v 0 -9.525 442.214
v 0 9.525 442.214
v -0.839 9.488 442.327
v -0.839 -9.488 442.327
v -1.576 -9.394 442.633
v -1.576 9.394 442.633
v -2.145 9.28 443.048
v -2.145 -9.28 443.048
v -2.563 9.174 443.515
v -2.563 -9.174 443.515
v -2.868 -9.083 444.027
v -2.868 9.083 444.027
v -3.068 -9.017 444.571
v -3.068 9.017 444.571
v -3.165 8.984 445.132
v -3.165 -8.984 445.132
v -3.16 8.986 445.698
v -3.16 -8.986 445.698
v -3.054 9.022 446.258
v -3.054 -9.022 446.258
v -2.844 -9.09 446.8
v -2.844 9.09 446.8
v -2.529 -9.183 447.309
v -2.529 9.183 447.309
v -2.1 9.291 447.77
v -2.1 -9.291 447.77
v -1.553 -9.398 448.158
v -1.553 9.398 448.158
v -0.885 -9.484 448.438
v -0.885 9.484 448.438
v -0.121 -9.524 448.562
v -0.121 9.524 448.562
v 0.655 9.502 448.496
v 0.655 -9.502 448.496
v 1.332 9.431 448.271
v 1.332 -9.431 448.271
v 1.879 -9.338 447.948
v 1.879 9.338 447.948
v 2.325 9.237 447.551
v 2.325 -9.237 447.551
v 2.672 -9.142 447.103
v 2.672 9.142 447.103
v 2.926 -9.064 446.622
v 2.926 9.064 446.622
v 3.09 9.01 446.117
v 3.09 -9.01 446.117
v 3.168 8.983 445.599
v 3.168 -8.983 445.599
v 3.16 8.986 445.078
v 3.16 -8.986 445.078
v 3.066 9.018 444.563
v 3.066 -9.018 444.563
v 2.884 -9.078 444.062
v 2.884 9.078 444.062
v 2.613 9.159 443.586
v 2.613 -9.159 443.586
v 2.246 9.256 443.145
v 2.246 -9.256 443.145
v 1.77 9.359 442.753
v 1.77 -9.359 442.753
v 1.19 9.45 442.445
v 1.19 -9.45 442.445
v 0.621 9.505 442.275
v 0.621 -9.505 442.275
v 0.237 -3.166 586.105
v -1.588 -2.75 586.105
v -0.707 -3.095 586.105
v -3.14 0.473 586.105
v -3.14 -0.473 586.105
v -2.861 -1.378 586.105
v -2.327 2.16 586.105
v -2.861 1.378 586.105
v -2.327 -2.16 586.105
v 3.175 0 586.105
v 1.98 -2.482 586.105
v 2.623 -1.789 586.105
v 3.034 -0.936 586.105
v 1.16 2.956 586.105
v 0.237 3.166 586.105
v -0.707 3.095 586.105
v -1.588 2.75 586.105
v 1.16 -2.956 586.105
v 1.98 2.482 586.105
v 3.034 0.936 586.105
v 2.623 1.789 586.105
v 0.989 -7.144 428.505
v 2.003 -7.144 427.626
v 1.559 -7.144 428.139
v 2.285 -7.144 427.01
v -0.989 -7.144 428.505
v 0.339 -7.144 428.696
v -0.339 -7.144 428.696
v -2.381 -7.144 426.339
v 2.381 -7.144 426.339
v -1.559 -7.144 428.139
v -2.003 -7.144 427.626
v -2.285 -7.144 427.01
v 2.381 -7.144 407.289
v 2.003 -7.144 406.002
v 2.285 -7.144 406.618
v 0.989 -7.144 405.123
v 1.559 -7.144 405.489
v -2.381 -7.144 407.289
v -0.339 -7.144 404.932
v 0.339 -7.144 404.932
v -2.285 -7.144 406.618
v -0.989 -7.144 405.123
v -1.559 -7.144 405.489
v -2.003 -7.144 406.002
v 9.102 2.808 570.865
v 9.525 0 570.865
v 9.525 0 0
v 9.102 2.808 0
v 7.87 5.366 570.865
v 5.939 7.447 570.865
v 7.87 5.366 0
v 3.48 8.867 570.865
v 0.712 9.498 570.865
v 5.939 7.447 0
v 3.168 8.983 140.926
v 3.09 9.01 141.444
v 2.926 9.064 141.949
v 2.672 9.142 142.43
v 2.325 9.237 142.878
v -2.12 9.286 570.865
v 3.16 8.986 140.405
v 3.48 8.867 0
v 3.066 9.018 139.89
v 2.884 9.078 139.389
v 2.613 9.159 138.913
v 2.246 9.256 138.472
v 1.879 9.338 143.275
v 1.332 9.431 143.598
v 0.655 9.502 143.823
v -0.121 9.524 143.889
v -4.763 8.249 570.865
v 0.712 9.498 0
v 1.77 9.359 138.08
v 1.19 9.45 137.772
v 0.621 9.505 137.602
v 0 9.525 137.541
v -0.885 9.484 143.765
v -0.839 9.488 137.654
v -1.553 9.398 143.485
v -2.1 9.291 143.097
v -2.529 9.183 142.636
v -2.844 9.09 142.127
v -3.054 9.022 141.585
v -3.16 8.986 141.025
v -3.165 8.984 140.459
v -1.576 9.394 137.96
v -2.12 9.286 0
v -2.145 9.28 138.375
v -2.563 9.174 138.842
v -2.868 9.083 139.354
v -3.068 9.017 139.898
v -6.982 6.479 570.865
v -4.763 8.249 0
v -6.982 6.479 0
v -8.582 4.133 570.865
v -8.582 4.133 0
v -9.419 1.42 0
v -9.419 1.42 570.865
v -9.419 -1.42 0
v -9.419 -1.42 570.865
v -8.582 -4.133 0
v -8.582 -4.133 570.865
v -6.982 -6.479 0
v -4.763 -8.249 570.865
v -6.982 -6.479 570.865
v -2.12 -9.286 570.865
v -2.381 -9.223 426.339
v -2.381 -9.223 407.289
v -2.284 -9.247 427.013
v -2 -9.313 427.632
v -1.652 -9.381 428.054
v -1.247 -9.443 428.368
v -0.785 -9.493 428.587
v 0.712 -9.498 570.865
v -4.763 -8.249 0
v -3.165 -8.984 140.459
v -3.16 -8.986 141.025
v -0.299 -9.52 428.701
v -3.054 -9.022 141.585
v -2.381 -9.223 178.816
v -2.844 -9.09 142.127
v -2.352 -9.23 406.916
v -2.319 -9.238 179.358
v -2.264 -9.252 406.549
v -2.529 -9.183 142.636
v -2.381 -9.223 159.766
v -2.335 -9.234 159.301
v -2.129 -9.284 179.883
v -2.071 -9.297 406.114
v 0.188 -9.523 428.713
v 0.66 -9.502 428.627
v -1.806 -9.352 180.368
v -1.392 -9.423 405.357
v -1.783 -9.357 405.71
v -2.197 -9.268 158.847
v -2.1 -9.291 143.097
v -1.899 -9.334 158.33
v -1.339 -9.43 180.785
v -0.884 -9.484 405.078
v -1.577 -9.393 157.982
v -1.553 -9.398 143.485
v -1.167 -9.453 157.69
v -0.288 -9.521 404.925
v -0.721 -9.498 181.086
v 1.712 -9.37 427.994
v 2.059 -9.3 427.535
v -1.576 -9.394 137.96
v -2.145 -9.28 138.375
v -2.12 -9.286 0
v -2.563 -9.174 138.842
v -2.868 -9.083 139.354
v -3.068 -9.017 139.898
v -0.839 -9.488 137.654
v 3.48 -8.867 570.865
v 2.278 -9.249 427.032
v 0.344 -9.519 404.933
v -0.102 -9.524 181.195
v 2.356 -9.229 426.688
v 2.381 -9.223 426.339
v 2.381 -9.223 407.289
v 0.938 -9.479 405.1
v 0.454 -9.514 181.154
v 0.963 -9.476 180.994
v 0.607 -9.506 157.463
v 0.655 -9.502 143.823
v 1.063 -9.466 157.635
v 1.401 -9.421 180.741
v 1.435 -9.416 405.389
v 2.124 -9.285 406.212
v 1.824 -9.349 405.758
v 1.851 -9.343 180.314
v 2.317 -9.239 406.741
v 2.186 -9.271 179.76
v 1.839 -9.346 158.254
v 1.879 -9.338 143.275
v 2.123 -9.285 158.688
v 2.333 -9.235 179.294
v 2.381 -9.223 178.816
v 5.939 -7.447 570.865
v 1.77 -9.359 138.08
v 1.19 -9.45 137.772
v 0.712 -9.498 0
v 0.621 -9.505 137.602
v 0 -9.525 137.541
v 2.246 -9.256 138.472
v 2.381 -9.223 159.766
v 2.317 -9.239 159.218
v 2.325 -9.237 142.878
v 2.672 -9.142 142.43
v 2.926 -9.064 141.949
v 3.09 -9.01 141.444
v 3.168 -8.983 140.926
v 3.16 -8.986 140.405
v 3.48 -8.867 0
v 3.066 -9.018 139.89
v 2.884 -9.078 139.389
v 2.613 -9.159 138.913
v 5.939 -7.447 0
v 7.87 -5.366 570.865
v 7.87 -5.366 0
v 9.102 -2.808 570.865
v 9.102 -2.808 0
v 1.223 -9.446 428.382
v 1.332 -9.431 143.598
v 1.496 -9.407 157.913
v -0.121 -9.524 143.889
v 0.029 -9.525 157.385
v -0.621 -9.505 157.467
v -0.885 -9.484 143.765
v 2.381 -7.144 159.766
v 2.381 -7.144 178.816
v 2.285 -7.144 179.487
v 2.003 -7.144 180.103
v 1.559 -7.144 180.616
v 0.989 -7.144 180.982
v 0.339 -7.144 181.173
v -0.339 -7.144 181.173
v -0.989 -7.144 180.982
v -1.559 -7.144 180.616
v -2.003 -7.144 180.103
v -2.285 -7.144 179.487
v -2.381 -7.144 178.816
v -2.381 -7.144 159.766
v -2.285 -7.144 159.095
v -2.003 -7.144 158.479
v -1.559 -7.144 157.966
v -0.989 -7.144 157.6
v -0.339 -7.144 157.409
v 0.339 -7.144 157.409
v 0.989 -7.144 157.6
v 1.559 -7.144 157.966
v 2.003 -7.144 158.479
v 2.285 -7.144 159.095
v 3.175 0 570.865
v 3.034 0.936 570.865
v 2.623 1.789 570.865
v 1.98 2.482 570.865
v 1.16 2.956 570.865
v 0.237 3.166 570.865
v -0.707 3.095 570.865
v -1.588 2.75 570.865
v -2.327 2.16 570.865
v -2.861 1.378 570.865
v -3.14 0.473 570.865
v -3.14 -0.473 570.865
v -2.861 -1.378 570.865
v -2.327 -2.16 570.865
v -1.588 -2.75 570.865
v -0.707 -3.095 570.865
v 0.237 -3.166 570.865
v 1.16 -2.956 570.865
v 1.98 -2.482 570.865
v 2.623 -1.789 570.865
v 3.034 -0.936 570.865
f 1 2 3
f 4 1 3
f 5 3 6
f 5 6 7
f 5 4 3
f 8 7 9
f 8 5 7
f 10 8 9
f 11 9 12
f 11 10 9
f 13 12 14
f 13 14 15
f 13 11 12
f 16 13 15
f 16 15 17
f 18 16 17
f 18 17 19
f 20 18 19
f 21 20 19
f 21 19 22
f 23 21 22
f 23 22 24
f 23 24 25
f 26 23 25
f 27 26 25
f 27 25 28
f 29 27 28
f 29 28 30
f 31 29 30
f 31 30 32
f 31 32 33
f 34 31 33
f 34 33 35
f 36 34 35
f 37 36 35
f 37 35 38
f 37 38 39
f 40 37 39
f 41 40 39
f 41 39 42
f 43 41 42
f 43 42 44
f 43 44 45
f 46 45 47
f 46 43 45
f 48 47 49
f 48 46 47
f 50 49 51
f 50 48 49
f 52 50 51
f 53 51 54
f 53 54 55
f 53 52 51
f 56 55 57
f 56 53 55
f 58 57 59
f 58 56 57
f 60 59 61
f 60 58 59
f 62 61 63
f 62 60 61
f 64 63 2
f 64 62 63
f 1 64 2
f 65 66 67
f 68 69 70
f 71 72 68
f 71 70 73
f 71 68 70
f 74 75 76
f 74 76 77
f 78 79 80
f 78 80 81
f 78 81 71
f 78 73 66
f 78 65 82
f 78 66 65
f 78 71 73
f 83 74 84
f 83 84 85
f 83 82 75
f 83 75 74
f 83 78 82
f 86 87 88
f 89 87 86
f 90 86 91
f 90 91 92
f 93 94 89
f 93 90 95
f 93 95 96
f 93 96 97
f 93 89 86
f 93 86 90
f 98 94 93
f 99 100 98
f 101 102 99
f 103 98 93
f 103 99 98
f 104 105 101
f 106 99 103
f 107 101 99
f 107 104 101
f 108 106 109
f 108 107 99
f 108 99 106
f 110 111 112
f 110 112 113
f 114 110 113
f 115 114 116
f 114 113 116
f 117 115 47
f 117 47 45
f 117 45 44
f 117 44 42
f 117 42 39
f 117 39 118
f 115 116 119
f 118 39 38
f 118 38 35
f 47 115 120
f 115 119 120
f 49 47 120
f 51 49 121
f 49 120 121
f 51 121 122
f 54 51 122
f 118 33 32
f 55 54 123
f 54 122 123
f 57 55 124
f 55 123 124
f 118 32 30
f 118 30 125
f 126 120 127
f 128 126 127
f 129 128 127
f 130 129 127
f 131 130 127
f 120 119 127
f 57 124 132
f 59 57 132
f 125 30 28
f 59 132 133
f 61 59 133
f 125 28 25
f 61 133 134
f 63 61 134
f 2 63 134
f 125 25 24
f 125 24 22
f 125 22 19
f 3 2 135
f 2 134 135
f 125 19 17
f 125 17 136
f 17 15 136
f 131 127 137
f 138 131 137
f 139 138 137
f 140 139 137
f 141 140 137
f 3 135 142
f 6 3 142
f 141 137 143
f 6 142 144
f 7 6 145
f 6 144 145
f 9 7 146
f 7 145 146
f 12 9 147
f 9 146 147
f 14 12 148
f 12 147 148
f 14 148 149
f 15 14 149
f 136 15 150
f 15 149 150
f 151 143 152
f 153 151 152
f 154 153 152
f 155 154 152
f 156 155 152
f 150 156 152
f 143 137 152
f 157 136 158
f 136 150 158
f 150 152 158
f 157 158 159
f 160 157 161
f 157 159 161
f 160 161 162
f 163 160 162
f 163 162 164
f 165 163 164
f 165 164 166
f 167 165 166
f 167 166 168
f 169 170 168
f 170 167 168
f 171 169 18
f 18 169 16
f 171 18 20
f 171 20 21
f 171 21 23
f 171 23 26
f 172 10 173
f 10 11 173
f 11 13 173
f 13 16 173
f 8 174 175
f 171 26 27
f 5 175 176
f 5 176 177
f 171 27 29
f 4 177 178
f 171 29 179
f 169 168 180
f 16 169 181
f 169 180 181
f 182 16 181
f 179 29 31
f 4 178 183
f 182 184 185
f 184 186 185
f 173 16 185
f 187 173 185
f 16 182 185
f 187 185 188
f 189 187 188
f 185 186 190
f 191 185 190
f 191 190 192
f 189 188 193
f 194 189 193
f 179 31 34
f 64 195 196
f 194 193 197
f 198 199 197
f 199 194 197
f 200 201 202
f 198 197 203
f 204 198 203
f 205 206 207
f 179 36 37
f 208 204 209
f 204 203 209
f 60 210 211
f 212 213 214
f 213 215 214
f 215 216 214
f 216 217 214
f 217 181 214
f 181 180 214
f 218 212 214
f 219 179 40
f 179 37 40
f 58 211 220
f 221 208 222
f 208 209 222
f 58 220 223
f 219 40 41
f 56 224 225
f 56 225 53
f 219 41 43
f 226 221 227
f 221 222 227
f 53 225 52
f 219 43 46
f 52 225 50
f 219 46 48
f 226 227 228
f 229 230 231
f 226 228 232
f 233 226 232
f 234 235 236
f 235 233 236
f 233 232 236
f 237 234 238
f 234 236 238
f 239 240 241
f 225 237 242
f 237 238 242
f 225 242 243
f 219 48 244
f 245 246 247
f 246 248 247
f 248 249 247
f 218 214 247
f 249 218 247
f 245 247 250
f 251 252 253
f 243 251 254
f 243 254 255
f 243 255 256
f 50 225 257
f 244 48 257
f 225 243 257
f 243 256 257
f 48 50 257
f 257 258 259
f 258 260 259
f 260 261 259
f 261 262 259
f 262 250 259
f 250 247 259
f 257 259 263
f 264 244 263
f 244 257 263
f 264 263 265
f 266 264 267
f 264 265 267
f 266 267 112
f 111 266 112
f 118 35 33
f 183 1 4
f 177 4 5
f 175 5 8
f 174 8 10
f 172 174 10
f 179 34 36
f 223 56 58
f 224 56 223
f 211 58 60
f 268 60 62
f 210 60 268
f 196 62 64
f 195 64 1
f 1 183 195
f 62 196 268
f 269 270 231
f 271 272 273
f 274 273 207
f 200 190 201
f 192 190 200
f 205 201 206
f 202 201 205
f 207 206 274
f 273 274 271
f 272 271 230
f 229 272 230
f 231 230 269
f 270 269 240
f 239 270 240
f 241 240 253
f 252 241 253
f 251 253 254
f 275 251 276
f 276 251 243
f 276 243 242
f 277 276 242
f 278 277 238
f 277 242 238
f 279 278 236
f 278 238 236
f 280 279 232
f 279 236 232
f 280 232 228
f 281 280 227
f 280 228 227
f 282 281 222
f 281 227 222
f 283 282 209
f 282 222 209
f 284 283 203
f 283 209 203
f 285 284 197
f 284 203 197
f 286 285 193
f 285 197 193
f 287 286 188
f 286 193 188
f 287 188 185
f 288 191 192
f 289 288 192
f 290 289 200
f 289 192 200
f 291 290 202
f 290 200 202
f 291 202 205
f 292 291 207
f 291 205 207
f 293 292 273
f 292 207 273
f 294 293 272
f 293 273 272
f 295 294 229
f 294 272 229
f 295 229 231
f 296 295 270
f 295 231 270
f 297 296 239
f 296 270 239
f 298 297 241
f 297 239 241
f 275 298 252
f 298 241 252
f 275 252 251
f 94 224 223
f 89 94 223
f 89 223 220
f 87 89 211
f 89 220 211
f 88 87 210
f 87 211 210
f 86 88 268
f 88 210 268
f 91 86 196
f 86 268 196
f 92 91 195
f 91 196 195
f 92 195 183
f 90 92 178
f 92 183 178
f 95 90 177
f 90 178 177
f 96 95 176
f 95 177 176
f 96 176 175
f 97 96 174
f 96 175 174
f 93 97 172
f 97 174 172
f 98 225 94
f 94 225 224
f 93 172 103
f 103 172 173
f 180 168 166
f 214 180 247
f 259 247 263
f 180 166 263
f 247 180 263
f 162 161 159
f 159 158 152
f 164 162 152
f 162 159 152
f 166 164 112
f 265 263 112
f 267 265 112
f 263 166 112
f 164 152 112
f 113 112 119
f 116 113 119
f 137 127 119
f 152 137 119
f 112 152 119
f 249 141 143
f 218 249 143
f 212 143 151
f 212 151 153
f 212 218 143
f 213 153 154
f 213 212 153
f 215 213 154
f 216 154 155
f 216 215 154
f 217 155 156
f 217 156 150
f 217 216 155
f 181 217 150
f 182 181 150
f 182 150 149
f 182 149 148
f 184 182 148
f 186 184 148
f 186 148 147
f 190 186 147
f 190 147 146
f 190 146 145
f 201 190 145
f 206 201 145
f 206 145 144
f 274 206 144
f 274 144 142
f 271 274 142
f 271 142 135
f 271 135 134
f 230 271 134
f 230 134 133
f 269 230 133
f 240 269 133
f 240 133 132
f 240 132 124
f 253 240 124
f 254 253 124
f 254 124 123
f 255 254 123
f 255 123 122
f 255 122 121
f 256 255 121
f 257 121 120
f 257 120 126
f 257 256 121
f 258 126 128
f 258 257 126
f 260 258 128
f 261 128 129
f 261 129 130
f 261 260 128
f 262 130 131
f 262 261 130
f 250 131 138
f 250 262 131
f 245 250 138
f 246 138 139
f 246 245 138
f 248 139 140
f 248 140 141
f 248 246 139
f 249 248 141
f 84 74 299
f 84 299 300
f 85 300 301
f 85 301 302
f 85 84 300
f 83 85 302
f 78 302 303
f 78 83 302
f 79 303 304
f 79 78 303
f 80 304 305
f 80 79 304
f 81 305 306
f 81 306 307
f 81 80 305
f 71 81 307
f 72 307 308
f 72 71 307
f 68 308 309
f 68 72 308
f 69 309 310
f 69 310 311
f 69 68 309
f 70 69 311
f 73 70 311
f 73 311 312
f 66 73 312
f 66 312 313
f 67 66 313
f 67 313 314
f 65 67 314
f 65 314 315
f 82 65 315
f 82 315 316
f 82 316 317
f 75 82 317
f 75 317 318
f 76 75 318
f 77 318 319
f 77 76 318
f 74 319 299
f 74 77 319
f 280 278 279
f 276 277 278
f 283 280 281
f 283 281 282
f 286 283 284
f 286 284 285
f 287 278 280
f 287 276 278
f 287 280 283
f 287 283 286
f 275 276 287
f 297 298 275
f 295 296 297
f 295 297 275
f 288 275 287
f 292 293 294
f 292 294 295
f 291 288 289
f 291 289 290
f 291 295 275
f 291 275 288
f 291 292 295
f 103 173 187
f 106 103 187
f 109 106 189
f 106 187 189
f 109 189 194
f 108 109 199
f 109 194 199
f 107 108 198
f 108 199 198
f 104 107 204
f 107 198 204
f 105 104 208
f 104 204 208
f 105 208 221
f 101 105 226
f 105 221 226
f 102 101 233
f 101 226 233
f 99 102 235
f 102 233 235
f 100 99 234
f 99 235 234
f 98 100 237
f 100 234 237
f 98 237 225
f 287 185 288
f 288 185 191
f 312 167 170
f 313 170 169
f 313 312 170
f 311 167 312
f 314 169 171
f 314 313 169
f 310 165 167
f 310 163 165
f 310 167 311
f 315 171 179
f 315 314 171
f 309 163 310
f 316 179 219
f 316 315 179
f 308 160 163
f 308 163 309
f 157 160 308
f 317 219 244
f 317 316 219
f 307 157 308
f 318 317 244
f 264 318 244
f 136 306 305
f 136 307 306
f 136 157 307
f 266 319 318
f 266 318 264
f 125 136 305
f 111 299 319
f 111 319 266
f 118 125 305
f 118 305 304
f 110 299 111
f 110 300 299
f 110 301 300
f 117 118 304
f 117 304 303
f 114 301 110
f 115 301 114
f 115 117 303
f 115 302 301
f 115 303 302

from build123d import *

# Parameters (mm, degrees)
SKETCH1_R           = 9.525
BOSS_EXTRUDE1_DEPTH = 586.105
CUT_EXTRUDE2_REACH  = 588.492
SKETCH3_R           = 3.175
CUT_EXTRUDE3_DEPTH  = 2.38125
SKETCH6_OUTSIDE_W   = 138.394
SKETCH6_OUTSIDE_H   = 138.394
SKETCH6_OUTSIDE_R   = 3.175
CUT_EXTRUDE4_DEPTH  = 15.24


with BuildPart() as part:
    # Sketch1 → Boss-Extrude1 (new body)
    with BuildSketch(Plane.XY):
        Circle(SKETCH1_R)
    extrude(amount=BOSS_EXTRUDE1_DEPTH)

    # Sketch3 → Cut-Extrude2 (cut, up to next)
    with BuildSketch(Plane(origin=(0, -9.525, 0), x_dir=(1, 0, 0), z_dir=(0, 1, 0)), mode=Mode.PRIVATE) as cut_extrude2_sk1:
        with Locations((0, -445.389)):
            Circle(SKETCH3_R)
    cut_extrude2_tool1 = extrude(cut_extrude2_sk1.sketch, amount=CUT_EXTRUDE2_REACH, mode=Mode.PRIVATE) & part.part
    # Sketch3 → Cut-Extrude2 (cut, up to next)
    with BuildSketch(Plane(origin=(0, -9.525, 0), x_dir=(1, 0, 0), z_dir=(0, 1, 0)), mode=Mode.PRIVATE) as cut_extrude2_sk2:
        with Locations((0, -140.716)):
            Circle(SKETCH3_R)
    cut_extrude2_tool2 = extrude(cut_extrude2_sk2.sketch, amount=CUT_EXTRUDE2_REACH, mode=Mode.PRIVATE) & part.part
    add(cut_extrude2_tool1.solids().sort_by_distance((0, -9.525, 445.389))[0], mode=Mode.SUBTRACT)
    add(cut_extrude2_tool2.solids().sort_by_distance((0, -9.525, 140.716))[0], mode=Mode.SUBTRACT)

    # Sketch5 → Cut-Extrude3 (cut)
    with BuildSketch(Plane(origin=(0, -9.525, 0), x_dir=(1, 0, 0), z_dir=(0, 1, 0))):
        with BuildLine():
            Line((-2.38125, -178.816), (-2.38125, -159.766))
            ThreePointArc((-2.38125, -159.766), (0, -157.38475), (2.38125, -159.766))
            Line((2.38125, -159.766), (2.38125, -178.816))
            ThreePointArc((2.38125, -178.816), (0, -181.19725), (-2.38125, -178.816))
        make_face()
        with BuildLine():
            Line((2.38125, -407.289), (2.38125, -426.339))
            ThreePointArc((2.38125, -426.339), (0, -428.72025), (-2.38125, -426.339))
            Line((-2.38125, -426.339), (-2.38125, -407.289))
            ThreePointArc((-2.38125, -407.289), (0, -404.90775), (2.38125, -407.289))
        make_face()
    extrude(amount=CUT_EXTRUDE3_DEPTH, mode=Mode.SUBTRACT)

    # Sketch6 outside → Cut-Extrude4 (cut)
    with BuildSketch(Plane.XY.offset(586.105)):
        Rectangle(SKETCH6_OUTSIDE_W, SKETCH6_OUTSIDE_H)
        Circle(SKETCH6_OUTSIDE_R, mode=Mode.SUBTRACT)
    extrude(amount=-CUT_EXTRUDE4_DEPTH, mode=Mode.SUBTRACT)


solid = part.part
